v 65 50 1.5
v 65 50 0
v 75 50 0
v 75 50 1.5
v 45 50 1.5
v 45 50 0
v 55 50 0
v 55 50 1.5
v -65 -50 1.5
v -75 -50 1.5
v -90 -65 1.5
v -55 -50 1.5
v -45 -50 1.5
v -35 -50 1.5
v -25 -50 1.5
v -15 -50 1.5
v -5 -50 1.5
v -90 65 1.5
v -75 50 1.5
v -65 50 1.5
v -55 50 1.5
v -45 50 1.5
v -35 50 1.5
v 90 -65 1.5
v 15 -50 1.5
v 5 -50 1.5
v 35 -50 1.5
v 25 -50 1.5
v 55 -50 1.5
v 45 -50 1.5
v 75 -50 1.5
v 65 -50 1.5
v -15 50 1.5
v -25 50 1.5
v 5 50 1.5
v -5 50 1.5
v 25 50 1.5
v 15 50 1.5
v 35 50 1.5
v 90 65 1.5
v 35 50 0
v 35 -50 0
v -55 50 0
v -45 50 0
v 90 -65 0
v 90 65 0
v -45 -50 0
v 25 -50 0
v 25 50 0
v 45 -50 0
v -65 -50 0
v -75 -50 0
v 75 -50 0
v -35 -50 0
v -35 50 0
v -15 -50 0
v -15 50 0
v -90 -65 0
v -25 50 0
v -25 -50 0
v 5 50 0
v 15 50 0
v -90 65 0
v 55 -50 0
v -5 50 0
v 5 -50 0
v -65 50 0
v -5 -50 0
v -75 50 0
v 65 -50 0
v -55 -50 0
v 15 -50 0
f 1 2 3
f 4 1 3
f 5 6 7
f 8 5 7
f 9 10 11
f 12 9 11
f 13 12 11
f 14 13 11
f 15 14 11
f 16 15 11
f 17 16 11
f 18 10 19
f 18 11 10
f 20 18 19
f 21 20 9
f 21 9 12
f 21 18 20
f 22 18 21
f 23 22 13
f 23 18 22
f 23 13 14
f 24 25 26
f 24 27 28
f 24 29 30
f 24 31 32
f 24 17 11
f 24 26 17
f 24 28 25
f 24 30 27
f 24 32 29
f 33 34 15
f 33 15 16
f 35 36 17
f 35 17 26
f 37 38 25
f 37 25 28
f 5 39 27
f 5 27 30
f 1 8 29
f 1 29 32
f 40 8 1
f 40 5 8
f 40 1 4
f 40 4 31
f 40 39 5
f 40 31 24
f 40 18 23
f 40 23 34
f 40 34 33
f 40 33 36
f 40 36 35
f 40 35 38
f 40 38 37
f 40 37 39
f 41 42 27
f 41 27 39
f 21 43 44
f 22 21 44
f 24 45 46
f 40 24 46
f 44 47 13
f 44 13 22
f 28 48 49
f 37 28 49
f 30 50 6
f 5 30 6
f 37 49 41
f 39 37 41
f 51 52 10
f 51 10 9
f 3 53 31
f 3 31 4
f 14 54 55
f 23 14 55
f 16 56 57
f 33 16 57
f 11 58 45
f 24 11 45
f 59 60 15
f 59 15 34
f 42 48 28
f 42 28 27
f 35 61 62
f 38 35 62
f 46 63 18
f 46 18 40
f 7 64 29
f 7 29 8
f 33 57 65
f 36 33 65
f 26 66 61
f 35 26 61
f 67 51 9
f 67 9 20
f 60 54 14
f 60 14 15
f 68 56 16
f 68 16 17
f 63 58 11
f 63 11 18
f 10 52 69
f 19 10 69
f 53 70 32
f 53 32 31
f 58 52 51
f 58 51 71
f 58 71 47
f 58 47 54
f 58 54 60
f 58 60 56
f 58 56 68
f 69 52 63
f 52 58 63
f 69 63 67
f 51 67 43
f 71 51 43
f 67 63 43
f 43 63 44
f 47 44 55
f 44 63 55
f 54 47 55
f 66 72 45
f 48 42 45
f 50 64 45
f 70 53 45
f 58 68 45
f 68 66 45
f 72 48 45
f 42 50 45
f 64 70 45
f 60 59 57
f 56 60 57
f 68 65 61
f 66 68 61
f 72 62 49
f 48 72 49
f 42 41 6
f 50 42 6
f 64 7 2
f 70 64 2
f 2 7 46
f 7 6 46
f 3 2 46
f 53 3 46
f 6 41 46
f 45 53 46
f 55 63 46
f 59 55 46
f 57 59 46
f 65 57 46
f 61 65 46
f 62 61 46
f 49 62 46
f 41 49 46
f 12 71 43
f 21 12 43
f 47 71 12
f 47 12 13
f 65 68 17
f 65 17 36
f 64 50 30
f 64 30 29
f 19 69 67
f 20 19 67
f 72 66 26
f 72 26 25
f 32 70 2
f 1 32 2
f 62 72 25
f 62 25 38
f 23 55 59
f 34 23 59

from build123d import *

# Parameters (mm, degrees)
F0_W     = 180
F0_H     = 130
F0_W_2   = 10
F0_H_2   = 100
F1_DEPTH = 1.5


with BuildPart() as f1:
    # F0 (on Top) → F1 (new body)
    with BuildSketch(Plane.XY):
        Rectangle(F0_W, F0_H)
        with Locations((-70, 0)):
            Rectangle(F0_W_2, F0_H_2, mode=Mode.SUBTRACT)
        with Locations((-50, 0)):
            Rectangle(F0_W_2, F0_H_2, mode=Mode.SUBTRACT)
        with Locations((-30, 0)):
            Rectangle(F0_W_2, F0_H_2, mode=Mode.SUBTRACT)
        with Locations((-10, 0)):
            Rectangle(F0_W_2, F0_H_2, mode=Mode.SUBTRACT)
        with Locations((10, 0)):
            Rectangle(F0_W_2, F0_H_2, mode=Mode.SUBTRACT)
        with Locations((30, 0)):
            Rectangle(F0_W_2, F0_H_2, mode=Mode.SUBTRACT)
        with Locations((50, 0)):
            Rectangle(F0_W_2, F0_H_2, mode=Mode.SUBTRACT)
        with Locations((70, 0)):
            Rectangle(F0_W_2, F0_H_2, mode=Mode.SUBTRACT)
    extrude(amount=F1_DEPTH)


solid = f1.part
